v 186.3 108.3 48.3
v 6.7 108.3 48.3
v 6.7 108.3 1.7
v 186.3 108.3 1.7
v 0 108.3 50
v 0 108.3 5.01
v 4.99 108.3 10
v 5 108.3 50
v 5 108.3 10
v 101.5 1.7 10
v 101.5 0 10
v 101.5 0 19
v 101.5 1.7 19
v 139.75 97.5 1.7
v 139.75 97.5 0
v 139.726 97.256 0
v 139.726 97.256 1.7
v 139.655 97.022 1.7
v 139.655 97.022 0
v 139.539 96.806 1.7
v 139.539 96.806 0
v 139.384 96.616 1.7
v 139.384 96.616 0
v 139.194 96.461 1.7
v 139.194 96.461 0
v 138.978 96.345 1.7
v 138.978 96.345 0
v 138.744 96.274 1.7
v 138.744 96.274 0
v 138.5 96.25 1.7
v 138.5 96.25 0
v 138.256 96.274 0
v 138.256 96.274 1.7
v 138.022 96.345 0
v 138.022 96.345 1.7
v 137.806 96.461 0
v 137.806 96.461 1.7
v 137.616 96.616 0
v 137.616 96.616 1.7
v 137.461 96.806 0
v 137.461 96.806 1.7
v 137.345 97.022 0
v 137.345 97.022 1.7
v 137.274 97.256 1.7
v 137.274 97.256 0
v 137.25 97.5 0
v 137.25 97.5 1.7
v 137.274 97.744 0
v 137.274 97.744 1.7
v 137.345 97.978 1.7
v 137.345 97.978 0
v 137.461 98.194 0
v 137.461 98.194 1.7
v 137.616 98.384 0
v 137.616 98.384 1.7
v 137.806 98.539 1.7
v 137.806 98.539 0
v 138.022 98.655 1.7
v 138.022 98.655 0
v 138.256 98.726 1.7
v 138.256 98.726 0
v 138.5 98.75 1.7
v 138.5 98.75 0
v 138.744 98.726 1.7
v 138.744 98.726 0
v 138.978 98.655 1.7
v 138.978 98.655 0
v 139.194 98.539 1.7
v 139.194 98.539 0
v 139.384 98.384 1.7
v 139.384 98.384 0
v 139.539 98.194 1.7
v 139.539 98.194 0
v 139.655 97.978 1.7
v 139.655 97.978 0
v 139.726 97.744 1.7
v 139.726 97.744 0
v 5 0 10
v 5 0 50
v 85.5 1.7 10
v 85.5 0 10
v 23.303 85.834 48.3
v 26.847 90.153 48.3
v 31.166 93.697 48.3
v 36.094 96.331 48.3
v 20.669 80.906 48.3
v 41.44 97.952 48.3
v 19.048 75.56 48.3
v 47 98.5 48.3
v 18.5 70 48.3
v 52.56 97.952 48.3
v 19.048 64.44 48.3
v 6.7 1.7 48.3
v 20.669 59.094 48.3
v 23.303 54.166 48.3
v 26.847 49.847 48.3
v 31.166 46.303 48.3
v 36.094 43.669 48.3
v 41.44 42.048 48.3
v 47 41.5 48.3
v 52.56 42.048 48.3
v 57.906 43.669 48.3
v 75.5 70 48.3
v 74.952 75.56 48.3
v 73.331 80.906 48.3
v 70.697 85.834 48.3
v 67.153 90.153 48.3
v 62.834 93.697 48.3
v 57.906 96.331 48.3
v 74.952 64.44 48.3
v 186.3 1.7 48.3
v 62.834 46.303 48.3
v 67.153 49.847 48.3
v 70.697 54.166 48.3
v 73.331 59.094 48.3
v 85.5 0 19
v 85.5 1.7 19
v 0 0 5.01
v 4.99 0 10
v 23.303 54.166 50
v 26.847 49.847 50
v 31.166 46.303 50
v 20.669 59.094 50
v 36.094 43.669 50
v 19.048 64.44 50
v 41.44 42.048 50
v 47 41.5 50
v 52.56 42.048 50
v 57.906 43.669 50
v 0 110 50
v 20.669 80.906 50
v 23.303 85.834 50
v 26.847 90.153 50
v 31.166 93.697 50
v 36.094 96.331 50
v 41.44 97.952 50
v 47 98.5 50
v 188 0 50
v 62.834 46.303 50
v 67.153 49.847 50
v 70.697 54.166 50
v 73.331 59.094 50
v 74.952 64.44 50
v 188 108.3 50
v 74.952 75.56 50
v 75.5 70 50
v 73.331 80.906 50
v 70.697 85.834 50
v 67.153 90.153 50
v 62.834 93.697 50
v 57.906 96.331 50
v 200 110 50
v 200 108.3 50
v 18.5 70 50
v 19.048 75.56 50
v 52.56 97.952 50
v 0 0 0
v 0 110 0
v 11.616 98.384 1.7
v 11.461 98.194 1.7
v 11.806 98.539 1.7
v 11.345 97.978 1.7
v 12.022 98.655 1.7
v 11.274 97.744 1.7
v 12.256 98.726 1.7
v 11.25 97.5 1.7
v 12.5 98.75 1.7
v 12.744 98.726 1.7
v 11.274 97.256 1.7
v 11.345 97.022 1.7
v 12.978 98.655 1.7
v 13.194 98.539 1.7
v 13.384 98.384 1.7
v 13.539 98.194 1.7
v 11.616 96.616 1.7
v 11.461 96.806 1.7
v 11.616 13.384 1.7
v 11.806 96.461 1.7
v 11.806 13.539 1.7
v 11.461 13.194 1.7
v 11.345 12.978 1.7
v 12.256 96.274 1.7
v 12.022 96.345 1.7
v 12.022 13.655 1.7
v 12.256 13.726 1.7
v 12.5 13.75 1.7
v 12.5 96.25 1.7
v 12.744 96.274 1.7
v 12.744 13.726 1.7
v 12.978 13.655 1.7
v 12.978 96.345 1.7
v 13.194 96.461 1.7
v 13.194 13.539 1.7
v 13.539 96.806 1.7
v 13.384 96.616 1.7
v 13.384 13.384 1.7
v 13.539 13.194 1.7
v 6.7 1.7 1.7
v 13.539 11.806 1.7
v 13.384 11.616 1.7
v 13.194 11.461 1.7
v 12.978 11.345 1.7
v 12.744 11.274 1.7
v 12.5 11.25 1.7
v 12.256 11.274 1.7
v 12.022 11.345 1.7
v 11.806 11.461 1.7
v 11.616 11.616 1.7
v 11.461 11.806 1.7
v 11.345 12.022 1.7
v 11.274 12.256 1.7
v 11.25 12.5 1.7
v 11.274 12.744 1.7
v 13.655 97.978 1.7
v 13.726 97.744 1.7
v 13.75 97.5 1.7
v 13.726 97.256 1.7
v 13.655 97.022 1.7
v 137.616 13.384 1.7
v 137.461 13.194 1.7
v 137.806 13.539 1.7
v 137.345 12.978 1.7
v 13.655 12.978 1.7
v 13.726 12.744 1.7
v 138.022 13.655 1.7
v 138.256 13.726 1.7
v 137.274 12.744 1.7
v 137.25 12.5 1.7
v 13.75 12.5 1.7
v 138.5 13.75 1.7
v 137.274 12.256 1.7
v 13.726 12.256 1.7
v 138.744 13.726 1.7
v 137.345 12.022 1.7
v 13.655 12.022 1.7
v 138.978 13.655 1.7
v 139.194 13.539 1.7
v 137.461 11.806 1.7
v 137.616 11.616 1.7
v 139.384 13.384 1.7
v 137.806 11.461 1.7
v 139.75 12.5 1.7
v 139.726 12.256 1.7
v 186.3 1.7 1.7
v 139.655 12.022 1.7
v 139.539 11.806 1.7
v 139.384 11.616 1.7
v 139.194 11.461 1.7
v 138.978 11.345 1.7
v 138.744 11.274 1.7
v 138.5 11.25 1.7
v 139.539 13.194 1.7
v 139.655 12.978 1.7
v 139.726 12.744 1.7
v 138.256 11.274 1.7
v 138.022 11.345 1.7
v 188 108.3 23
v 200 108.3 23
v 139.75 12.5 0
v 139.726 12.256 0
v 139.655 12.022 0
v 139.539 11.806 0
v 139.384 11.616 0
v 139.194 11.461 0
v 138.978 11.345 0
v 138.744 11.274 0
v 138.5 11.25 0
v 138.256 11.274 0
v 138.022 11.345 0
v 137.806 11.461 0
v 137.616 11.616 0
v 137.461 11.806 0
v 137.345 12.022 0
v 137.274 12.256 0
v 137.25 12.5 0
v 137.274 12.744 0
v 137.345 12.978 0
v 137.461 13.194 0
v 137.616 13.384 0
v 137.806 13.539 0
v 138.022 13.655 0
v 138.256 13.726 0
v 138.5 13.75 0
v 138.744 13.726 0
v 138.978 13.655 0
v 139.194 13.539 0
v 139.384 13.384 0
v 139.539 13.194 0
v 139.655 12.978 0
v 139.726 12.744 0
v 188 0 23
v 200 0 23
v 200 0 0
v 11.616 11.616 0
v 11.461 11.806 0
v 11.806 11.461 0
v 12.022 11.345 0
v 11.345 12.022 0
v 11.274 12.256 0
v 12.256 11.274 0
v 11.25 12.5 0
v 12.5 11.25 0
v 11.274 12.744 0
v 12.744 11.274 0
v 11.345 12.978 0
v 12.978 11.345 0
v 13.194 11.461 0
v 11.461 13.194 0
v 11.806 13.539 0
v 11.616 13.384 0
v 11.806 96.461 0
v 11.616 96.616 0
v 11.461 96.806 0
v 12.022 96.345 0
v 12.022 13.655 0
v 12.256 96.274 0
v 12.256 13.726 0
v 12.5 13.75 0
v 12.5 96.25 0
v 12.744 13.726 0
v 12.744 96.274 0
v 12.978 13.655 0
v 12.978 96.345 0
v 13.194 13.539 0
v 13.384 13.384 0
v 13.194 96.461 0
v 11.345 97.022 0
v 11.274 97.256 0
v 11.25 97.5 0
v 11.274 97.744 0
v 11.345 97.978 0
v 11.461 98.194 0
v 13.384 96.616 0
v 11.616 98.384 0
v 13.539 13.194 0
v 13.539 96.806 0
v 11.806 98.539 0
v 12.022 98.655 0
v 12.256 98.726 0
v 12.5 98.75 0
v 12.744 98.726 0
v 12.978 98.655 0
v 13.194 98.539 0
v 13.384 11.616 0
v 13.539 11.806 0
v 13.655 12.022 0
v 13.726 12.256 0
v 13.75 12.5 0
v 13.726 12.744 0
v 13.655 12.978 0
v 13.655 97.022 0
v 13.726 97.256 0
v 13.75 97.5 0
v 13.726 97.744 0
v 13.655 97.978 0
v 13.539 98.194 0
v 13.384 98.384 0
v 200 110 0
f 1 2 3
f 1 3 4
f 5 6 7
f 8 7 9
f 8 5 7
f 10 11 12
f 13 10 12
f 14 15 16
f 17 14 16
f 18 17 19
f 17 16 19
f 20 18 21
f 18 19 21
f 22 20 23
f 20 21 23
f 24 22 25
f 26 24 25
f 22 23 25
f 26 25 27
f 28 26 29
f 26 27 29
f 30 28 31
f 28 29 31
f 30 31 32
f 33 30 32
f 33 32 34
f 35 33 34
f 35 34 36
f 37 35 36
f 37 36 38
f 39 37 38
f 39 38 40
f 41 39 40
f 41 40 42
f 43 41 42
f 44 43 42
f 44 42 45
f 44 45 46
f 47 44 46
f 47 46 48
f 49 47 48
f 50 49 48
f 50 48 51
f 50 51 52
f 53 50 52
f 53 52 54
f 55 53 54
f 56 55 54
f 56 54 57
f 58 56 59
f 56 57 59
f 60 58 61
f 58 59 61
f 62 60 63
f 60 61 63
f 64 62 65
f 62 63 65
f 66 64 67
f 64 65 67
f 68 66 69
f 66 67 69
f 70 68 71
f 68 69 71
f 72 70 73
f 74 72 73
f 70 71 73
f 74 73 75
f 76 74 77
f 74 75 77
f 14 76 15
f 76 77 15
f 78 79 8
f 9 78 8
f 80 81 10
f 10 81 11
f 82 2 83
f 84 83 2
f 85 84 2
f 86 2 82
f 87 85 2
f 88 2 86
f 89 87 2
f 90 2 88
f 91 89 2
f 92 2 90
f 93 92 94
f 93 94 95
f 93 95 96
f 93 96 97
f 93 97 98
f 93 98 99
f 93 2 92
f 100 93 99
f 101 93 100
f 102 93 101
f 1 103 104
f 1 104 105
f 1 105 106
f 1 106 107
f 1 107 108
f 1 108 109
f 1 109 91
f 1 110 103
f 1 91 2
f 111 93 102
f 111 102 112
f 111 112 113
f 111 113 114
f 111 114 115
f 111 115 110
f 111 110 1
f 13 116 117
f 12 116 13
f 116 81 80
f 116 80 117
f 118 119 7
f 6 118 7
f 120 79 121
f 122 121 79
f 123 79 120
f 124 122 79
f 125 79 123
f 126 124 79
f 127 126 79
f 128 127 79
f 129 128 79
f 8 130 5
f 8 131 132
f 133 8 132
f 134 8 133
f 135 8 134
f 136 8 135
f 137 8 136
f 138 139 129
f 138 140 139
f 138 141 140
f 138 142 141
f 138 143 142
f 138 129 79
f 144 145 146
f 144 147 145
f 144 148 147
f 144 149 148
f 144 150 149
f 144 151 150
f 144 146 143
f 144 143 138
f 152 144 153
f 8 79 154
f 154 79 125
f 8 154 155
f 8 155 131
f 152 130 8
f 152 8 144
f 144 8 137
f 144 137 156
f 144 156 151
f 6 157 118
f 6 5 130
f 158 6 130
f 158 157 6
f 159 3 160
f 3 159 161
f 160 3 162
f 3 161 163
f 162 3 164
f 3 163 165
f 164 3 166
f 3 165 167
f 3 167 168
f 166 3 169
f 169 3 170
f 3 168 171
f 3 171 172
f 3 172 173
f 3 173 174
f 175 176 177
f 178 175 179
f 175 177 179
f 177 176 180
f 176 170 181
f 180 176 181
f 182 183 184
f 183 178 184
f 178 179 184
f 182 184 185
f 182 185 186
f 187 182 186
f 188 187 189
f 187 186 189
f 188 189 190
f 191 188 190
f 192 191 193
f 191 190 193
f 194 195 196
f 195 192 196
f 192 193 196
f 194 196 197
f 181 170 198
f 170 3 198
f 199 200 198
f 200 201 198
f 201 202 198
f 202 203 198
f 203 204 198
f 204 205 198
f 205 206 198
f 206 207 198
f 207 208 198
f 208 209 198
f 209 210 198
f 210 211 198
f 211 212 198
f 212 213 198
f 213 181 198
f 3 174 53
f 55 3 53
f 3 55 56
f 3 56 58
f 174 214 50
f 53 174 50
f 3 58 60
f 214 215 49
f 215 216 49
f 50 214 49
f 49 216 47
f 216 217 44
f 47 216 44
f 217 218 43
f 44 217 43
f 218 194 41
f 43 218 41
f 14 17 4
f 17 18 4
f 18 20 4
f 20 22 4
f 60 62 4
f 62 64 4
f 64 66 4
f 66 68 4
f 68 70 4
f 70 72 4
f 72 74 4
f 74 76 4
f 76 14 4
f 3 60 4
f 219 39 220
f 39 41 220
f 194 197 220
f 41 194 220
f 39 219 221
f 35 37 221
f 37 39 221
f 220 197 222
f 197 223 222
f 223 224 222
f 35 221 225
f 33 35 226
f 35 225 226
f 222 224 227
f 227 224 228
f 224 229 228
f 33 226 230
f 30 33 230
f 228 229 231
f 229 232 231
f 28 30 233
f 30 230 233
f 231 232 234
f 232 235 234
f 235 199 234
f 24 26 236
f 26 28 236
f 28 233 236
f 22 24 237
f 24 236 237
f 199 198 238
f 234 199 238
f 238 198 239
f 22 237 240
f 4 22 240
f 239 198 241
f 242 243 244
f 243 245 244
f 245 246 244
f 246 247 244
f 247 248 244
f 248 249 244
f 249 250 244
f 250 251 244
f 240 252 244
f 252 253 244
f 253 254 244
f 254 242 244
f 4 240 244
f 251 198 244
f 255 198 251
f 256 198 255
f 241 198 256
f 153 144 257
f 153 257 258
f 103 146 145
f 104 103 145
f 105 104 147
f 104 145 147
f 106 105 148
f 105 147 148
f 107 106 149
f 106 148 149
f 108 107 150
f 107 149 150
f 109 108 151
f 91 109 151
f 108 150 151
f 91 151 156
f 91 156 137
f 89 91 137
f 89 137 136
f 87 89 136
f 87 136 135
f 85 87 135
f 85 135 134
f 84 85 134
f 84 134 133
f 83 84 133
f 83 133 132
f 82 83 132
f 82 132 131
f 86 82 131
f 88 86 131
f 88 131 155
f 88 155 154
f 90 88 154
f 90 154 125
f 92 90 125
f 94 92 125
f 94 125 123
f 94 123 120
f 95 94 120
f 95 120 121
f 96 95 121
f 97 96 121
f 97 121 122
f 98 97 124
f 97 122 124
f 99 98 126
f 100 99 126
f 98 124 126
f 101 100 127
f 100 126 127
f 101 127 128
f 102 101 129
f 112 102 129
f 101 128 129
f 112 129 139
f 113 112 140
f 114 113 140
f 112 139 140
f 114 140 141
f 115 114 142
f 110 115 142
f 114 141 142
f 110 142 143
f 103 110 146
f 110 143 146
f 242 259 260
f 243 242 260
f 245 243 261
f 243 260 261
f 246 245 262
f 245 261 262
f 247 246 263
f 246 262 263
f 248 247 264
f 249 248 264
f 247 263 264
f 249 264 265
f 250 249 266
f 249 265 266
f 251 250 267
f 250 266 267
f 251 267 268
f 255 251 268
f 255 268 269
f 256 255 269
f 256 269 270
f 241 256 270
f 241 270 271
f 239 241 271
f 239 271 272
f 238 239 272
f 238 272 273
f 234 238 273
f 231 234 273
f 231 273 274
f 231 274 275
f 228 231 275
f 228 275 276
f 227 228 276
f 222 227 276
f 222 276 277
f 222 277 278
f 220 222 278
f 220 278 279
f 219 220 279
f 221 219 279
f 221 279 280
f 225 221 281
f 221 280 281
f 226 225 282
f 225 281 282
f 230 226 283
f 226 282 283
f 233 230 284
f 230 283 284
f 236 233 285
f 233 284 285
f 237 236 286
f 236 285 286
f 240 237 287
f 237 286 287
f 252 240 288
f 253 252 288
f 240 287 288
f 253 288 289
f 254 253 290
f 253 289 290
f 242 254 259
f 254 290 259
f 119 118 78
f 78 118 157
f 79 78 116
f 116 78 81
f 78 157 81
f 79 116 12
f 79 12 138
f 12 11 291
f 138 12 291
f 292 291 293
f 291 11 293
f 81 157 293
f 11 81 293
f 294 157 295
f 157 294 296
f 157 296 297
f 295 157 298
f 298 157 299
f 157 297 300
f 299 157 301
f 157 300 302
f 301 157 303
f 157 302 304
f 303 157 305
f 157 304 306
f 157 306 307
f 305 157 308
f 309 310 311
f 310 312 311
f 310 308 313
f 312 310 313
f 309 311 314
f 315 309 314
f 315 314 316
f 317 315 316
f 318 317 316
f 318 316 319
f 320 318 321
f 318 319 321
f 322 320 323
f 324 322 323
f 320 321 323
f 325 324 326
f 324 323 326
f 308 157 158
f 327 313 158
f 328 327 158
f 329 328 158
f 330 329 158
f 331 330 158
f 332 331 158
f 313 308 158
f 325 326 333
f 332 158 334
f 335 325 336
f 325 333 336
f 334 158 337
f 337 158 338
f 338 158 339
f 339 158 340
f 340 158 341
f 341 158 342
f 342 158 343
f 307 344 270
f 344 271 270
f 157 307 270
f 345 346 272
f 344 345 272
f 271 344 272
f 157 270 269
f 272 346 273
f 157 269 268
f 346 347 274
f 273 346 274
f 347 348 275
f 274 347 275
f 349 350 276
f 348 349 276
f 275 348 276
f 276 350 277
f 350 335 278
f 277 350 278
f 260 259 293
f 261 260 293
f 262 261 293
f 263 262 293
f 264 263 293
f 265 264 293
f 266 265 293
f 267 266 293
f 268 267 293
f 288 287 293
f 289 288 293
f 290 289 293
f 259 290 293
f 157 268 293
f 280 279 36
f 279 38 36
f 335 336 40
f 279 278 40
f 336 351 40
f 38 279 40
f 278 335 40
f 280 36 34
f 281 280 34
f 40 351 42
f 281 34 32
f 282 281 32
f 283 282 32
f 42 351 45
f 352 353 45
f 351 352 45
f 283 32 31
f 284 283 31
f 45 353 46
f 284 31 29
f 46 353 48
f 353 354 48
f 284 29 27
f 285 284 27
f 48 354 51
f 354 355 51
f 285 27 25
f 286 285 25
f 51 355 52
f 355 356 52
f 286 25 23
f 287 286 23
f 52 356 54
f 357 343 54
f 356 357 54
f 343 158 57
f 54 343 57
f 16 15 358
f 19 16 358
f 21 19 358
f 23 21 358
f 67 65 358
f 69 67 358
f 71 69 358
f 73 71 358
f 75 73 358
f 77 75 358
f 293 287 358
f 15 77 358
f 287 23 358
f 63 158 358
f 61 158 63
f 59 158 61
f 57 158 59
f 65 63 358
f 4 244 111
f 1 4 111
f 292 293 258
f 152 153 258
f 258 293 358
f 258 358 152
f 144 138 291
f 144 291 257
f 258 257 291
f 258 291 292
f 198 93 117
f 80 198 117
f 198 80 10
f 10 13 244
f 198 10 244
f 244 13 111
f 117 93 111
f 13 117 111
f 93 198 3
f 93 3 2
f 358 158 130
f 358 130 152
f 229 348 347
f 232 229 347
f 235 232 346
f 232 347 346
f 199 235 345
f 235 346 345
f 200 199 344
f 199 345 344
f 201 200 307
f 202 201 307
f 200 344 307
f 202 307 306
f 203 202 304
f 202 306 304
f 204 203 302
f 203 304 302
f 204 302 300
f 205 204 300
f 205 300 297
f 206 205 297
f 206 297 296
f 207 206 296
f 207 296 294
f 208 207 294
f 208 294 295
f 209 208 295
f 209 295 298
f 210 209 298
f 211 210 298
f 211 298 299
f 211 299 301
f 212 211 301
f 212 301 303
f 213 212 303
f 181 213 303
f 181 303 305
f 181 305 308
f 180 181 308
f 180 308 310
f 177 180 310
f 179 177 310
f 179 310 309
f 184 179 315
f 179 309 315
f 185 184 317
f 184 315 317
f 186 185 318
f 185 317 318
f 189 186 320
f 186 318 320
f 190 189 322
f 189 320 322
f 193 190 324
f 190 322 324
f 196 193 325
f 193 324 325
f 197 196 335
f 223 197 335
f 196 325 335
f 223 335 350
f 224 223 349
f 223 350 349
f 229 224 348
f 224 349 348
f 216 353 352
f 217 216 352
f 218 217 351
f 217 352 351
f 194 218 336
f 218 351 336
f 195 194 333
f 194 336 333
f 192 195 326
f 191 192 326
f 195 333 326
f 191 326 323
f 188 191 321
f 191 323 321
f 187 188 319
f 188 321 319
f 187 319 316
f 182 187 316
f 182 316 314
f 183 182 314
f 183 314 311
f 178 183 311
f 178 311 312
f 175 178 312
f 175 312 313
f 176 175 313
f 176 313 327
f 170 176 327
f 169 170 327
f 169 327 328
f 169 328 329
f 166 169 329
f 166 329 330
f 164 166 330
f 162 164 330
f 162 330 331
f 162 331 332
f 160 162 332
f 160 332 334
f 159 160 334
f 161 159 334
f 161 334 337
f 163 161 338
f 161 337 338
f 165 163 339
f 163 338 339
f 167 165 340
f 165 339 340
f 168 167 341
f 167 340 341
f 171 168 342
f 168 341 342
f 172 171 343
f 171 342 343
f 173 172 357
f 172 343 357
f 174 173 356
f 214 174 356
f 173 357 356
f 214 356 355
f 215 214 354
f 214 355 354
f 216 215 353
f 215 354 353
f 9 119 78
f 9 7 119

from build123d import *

# Parameters (mm, degrees)
SKETCH_W        = 200
SKETCH_H        = 110
PAD_DEPTH       = 50
SKETCH001_W     = 16
SKETCH001_H     = 9
POCKET_DEPTH    = 1.7
SKETCH002_W     = 12
SKETCH002_H     = 108.3
POCKET001_DEPTH = 27
SKETCH003_R     = 1.25
POCKET002_DEPTH = 10
SKETCH004_W     = 179.6
SKETCH004_H     = 46.6
POCKET003_DEPTH = 106.6
SKETCH005_W     = 5
SKETCH005_H     = 108.3
POCKET004_DEPTH = 40
CHAMFER_SIZE    = 4.99
SKETCH006_R     = 28.5
POCKET005_DEPTH = 5


with BuildPart() as part:
    # Sketch → Pad (new body)
    with BuildSketch(Plane.XY):
        with Locations((100, 55)):
            Rectangle(SKETCH_W, SKETCH_H)
    extrude(amount=PAD_DEPTH)

    # Sketch001 (on Face1 of Pad) → Pocket (cut)
    with BuildSketch(Plane.XZ):
        with Locations((93.5, 14.5)):
            Rectangle(SKETCH001_W, SKETCH001_H)
    extrude(amount=-POCKET_DEPTH, mode=Mode.SUBTRACT)

    # Sketch002 (on Face4 of Pocket) → Pocket001 (cut)
    with BuildSketch(Plane.XY.offset(50)):
        with Locations((194, 54.15)):
            Rectangle(SKETCH002_W, SKETCH002_H)
    extrude(amount=-POCKET001_DEPTH, mode=Mode.SUBTRACT)

    # Sketch003 (on Face2 of Pocket001) → Pocket002 (cut)
    with BuildSketch(Plane(origin=(0, 0, 0), x_dir=(1, 0, 0), z_dir=(0, 0, -1))):
        with Locations((12.5, -12.5)):
            Circle(SKETCH003_R)
        with Locations((12.5, -97.5)):
            Circle(SKETCH003_R)
        with Locations((138.5, -97.5)):
            Circle(SKETCH003_R)
        with Locations((138.5, -12.5)):
            Circle(SKETCH003_R)
    extrude(amount=-POCKET002_DEPTH, mode=Mode.SUBTRACT)

    # Sketch004 (on Face18 of Pocket002) → Pocket003 (cut)
    with BuildSketch(Plane.XZ.offset(-1.7)):
        with Locations((96.5, 25)):
            Rectangle(SKETCH004_W, SKETCH004_H)
    extrude(amount=-POCKET003_DEPTH, mode=Mode.SUBTRACT)

    # Sketch005 (on Face6 of Pocket003) → Pocket004 (cut)
    with BuildSketch(Plane.XY.offset(50)):
        with Locations((2.5, 54.15)):
            Rectangle(SKETCH005_W, SKETCH005_H)
    extrude(amount=-POCKET004_DEPTH, mode=Mode.SUBTRACT)

    # Chamfer
    chamfer_edges = [part.edges().sort_by_distance(p)[0] for p in [
        (0, 54.15, 10),
    ]]
    chamfer(chamfer_edges, length=CHAMFER_SIZE)

    # Sketch006 (on Face6 of Chamfer) → Pocket005 (cut)
    with BuildSketch(Plane.XY.offset(50)):
        with Locations((47, 70)):
            Circle(SKETCH006_R)
    extrude(amount=-POCKET005_DEPTH, mode=Mode.SUBTRACT)


solid = part.part
